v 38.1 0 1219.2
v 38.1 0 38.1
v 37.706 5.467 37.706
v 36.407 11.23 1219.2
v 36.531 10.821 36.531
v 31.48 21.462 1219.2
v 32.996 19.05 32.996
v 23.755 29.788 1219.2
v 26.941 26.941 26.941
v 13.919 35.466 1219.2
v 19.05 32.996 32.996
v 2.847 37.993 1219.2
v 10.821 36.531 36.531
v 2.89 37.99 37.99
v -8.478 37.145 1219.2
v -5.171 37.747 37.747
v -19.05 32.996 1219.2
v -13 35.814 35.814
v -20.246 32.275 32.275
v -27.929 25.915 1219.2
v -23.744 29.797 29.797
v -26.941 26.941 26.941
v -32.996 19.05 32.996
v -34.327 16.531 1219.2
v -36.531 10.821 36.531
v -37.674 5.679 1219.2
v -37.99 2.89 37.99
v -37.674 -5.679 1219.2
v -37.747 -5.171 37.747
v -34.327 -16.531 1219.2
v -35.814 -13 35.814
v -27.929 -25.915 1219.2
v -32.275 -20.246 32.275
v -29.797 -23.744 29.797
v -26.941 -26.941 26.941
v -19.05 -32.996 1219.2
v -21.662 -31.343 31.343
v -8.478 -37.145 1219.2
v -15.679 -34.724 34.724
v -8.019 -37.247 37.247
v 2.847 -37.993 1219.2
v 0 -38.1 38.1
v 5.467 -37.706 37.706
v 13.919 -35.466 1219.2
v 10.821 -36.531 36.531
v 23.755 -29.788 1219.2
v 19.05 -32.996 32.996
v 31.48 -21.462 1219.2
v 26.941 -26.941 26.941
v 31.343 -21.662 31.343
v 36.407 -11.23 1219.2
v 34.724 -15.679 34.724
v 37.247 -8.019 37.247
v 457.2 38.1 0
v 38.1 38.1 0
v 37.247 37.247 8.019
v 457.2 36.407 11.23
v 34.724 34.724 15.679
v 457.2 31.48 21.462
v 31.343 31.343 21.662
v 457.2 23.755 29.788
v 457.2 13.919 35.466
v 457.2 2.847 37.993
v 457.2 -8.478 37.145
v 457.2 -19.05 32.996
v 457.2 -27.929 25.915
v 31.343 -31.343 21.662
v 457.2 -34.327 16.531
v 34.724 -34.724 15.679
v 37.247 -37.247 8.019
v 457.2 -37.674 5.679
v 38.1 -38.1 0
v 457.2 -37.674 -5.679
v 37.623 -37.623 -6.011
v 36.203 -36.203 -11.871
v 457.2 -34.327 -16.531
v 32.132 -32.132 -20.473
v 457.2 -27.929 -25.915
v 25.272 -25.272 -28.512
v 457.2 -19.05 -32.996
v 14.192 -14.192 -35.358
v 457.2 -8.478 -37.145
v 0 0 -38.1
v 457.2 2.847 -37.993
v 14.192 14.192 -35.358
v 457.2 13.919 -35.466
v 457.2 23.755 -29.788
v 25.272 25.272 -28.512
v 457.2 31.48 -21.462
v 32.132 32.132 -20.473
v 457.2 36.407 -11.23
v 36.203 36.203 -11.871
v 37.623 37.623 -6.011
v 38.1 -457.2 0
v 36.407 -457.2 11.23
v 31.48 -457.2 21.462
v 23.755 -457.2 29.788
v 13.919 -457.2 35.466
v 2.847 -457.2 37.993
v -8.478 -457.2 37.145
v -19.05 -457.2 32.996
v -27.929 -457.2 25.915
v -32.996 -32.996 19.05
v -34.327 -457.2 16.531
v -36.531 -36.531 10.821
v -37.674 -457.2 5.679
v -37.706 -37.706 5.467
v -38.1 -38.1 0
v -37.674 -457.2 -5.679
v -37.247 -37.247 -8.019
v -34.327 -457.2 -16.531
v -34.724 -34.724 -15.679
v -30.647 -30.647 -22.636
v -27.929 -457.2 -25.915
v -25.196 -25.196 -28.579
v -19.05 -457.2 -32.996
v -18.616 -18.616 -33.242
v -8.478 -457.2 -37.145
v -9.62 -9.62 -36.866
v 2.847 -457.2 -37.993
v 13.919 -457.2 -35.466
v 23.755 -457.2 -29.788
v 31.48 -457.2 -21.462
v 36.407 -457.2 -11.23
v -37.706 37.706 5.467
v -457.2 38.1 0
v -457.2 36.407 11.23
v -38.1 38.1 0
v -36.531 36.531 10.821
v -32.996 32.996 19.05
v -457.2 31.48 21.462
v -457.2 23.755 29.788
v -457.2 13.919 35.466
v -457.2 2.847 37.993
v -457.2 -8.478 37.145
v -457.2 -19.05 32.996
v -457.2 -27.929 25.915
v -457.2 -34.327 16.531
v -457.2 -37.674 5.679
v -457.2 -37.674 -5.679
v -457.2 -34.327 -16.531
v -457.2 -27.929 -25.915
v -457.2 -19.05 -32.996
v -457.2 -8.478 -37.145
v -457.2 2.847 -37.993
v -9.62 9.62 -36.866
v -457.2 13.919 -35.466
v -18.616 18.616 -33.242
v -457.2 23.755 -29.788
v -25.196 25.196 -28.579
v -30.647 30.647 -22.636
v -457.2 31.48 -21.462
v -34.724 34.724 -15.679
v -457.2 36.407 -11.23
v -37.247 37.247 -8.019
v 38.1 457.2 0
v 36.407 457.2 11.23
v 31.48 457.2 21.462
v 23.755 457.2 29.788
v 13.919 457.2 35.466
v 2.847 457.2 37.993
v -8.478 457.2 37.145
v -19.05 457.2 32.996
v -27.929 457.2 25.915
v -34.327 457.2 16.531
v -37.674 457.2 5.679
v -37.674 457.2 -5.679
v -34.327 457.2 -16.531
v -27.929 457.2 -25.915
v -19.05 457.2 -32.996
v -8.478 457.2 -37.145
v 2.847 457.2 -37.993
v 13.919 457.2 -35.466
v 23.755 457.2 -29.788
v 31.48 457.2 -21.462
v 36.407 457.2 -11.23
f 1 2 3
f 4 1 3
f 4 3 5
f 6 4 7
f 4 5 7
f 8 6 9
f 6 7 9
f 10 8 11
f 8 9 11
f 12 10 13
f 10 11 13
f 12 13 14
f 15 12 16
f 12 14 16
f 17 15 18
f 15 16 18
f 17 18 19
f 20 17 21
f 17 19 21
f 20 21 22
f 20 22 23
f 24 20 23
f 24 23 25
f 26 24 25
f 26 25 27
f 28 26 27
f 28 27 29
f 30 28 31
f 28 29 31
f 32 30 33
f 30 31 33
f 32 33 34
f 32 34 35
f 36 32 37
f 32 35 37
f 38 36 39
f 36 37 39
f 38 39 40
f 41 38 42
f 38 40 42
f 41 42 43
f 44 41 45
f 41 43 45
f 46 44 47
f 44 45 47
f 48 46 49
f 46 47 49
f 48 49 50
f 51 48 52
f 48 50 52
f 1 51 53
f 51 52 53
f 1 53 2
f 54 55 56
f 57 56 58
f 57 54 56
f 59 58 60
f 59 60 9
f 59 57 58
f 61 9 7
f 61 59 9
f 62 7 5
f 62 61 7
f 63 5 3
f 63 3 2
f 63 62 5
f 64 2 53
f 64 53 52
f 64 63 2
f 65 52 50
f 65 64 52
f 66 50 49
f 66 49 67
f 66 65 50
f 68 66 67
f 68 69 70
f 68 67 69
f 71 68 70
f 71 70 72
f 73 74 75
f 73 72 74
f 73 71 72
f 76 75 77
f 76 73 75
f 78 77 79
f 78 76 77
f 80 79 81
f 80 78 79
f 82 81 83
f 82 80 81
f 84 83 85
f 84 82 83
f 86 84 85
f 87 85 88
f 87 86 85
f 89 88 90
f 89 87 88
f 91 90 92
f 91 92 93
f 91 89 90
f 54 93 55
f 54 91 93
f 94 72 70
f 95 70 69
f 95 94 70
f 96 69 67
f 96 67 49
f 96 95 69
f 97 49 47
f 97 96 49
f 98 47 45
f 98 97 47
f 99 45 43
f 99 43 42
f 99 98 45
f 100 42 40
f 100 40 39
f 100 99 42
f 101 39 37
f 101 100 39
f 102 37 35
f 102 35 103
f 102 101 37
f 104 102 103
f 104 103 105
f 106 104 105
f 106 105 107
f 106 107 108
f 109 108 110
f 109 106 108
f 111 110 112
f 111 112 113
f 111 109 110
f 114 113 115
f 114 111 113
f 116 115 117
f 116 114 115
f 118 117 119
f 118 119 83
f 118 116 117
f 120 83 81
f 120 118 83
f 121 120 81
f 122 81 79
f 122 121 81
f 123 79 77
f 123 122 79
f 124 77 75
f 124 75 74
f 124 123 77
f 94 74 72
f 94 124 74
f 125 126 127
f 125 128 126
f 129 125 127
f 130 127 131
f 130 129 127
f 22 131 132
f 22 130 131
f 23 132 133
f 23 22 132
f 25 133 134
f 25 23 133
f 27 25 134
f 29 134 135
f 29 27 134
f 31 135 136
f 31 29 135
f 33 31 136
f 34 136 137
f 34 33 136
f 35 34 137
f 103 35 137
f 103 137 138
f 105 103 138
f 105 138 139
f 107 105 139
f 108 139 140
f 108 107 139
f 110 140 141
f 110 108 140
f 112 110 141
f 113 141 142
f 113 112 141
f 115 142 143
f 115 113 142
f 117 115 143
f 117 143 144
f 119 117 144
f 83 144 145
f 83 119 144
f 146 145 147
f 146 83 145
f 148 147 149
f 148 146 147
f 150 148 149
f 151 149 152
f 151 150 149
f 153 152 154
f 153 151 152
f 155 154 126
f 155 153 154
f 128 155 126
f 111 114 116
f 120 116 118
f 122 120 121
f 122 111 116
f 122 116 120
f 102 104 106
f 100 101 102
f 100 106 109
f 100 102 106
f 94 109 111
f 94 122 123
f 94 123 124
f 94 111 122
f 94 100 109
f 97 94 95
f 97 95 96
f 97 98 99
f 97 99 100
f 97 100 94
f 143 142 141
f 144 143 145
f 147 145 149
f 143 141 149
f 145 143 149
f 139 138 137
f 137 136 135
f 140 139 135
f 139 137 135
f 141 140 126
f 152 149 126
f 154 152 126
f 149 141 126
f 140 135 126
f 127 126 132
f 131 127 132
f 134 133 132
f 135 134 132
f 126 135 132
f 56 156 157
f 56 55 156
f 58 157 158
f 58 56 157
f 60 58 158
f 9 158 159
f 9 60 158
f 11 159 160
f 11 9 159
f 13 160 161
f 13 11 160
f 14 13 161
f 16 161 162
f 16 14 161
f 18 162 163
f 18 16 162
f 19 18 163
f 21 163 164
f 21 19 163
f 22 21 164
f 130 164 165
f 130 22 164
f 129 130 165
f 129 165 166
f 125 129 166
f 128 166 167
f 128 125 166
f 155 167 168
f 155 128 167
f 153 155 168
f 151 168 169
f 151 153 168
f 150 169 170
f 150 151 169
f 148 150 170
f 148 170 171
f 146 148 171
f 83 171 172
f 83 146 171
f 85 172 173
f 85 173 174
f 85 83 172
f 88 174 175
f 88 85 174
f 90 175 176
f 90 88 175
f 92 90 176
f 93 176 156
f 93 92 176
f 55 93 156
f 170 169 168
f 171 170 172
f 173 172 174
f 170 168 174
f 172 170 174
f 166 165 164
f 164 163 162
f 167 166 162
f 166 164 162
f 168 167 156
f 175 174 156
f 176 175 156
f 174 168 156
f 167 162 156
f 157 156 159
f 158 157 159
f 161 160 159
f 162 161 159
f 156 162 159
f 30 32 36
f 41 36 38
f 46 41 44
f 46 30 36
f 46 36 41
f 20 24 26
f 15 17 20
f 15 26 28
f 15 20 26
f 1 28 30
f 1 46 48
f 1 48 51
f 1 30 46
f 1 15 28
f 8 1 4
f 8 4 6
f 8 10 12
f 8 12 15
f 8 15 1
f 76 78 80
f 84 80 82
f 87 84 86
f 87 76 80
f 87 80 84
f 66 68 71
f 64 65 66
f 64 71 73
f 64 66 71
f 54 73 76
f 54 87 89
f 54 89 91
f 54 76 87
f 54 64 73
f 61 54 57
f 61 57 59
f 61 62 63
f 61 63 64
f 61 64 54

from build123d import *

# Parameters (mm, degrees)
F0_R     = 38.1
F1_DEPTH = 457.2
F2_R     = 38.1
F3_DEPTH = 457.2
F4_R     = 38.1
F5_DEPTH = 1219.2


with BuildPart() as f1:
    # F0 (on Front) → F1 (new body, symmetric)
    with BuildSketch(Plane.XZ):
        Circle(F0_R)
    extrude(amount=F1_DEPTH, both=True)

    # F2 (on Right) → F3 (join, symmetric)
    with BuildSketch(Plane.YZ):
        Circle(F2_R)
    extrude(amount=F3_DEPTH, both=True)

    # F4 (on Top) → F5 (join)
    with BuildSketch(Plane.XY):
        Circle(F4_R)
    extrude(amount=F5_DEPTH)


solid = f1.part
